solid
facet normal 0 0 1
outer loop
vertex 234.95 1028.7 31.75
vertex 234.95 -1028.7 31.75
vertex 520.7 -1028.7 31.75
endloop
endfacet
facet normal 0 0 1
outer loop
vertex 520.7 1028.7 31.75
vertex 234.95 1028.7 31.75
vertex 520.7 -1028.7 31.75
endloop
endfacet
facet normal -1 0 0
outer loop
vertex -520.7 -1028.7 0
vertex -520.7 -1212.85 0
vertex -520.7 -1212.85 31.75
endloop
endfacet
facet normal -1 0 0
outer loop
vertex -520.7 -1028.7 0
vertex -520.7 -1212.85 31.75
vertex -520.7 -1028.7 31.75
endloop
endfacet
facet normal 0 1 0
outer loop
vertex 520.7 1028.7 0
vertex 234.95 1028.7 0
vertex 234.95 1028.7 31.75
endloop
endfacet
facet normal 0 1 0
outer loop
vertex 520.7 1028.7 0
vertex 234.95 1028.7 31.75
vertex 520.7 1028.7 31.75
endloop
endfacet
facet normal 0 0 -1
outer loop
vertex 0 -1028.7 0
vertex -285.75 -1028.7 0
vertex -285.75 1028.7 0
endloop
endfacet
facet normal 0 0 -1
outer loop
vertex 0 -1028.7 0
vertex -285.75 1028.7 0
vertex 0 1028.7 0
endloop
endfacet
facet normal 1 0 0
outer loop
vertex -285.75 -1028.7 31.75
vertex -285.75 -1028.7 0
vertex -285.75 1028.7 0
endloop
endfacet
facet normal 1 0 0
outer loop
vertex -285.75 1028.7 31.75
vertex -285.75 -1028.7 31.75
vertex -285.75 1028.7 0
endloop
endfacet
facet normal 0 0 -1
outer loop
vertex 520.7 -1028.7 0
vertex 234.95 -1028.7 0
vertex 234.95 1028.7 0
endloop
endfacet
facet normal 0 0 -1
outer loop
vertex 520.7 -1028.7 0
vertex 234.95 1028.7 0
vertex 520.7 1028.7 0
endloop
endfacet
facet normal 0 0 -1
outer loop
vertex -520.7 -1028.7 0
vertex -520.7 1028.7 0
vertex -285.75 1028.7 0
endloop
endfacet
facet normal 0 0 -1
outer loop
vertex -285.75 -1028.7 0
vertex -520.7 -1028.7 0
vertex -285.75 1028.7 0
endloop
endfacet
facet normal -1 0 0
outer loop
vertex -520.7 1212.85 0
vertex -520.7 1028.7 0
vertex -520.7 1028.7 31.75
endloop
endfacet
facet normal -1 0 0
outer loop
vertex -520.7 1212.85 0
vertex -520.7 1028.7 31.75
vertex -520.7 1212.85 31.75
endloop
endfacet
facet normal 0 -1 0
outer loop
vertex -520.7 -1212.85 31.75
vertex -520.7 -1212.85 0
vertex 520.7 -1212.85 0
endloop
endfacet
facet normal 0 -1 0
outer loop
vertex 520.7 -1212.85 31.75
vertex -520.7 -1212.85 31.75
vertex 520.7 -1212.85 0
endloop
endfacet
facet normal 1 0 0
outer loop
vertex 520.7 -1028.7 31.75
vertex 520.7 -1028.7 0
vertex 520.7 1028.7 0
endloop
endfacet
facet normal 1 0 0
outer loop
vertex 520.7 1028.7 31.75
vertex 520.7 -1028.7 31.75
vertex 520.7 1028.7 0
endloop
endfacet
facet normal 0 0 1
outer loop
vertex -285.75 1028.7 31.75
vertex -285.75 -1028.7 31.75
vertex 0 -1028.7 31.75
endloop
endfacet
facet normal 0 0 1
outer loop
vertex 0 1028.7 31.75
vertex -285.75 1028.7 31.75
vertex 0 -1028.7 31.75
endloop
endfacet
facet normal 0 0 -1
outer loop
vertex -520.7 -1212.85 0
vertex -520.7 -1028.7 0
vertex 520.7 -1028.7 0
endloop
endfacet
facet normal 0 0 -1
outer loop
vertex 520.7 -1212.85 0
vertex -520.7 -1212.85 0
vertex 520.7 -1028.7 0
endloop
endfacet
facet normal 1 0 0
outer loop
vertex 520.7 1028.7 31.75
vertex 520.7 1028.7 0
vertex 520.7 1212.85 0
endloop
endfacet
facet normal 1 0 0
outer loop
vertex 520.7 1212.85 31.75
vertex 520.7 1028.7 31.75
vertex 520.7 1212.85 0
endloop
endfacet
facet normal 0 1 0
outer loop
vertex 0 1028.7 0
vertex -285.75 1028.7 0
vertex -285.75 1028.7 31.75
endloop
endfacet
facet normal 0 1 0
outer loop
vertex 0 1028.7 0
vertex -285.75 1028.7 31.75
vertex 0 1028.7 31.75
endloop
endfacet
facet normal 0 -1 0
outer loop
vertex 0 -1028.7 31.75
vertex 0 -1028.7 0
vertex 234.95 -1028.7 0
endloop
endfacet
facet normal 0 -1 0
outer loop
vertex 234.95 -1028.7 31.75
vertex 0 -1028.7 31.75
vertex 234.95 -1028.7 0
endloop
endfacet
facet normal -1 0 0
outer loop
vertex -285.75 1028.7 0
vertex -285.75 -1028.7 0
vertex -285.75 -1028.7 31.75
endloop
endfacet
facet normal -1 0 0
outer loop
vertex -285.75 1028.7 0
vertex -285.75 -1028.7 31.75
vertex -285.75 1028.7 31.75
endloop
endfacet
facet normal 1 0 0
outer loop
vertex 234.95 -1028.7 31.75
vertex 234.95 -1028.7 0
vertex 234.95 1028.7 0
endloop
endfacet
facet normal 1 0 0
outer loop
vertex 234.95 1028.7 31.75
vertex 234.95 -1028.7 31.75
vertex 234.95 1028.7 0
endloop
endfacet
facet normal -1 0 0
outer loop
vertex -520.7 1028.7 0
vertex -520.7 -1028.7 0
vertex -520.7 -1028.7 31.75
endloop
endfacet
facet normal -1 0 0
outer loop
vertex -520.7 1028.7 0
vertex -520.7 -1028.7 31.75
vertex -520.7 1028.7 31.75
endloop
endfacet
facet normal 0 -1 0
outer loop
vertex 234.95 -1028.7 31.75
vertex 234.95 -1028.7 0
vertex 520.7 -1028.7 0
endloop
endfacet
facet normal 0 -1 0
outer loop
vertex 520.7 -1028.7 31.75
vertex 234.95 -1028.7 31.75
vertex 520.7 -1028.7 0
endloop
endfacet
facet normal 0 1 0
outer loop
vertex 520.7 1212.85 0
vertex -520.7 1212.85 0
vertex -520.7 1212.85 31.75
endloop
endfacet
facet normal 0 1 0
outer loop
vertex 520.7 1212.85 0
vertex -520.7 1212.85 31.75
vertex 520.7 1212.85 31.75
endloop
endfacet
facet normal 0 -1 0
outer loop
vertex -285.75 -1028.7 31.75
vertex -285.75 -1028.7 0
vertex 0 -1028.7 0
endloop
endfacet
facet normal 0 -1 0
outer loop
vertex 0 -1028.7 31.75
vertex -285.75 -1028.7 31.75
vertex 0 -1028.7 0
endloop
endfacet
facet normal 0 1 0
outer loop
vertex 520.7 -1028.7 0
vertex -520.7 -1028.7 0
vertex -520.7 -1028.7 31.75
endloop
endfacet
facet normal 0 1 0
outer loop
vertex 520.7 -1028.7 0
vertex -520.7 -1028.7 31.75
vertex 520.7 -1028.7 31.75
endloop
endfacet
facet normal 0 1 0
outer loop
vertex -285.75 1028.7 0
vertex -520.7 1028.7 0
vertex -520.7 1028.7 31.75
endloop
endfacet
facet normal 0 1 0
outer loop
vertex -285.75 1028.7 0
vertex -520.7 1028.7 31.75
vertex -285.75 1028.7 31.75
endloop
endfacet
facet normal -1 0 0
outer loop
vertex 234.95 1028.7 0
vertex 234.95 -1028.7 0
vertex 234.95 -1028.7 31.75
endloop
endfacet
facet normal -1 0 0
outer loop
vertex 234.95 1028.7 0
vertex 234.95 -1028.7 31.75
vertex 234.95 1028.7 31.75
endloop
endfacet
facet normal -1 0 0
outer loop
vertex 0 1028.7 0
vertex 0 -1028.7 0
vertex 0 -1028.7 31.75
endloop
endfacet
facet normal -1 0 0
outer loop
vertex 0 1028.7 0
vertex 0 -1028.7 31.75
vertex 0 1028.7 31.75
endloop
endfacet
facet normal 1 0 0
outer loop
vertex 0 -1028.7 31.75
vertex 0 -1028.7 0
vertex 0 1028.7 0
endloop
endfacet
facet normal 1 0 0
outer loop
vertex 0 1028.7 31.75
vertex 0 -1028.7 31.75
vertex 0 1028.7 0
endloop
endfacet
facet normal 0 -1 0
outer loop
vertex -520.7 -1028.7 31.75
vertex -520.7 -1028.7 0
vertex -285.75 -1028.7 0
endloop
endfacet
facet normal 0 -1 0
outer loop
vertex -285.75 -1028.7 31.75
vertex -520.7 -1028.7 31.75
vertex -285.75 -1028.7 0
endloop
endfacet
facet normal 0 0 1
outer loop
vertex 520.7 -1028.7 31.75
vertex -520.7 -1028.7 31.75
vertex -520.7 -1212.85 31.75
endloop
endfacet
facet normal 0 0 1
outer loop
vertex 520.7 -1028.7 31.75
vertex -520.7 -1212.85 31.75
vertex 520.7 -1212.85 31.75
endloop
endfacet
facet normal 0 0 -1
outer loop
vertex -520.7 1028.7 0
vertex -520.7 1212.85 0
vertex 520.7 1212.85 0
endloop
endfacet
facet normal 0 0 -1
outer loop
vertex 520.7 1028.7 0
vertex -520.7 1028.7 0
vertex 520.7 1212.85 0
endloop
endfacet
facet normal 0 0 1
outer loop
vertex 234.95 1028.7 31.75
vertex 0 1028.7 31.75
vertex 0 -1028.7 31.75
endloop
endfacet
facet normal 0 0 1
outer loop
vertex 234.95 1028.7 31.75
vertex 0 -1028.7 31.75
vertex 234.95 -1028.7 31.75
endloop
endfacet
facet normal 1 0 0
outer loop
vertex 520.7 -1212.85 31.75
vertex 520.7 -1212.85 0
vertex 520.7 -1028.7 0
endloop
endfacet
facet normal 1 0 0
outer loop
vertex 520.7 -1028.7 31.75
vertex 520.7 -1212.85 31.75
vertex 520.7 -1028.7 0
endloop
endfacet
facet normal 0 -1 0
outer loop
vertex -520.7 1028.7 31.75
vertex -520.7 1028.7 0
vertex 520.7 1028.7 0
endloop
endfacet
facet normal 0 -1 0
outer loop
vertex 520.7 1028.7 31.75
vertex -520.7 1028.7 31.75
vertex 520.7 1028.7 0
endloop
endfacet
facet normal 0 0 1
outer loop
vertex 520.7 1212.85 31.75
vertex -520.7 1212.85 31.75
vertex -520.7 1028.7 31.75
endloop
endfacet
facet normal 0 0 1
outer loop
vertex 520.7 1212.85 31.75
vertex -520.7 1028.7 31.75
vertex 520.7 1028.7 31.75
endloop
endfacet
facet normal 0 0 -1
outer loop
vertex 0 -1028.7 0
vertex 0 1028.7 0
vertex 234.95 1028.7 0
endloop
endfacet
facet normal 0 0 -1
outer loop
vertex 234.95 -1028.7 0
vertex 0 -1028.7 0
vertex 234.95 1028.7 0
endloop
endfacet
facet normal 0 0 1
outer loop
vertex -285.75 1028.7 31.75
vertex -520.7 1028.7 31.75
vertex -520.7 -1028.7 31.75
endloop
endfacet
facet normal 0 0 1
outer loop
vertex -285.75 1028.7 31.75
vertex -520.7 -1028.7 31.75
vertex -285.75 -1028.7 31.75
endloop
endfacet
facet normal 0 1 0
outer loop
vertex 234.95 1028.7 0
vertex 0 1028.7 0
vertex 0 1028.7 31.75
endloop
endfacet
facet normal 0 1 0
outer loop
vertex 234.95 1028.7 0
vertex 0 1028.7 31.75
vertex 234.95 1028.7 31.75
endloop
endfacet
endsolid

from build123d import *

# Parameters (mm, degrees)
F0_W     = 285.75
F0_H     = 2057.4
F5_DEPTH = 31.75
F1_W     = 234.95
F1_H     = 2057.4
F2_W     = 285.75
F2_H     = 2057.4
F3_W     = 234.95
F3_H     = 2057.4
F4_W     = 1041.4
F4_H     = 184.15


with BuildPart() as f5:
    # F0 (on Top) → F5 (new body)
    with BuildSketch(Plane.XY):
        with Locations((-142.875, 0)):
            Rectangle(F0_W, F0_H)
    extrude(amount=F5_DEPTH)


with BuildPart() as f5b:
    # F1 (on Top) → F5, piece 2 (new body)
    with BuildSketch(Plane.XY):
        with Locations((117.475, 0)):
            Rectangle(F1_W, F1_H)
    extrude(amount=F5_DEPTH)


with BuildPart() as f5c:
    # F2 (on Top) → F5, piece 3 (new body)
    with BuildSketch(Plane.XY):
        with Locations((377.825, 0)):
            Rectangle(F2_W, F2_H)
    extrude(amount=F5_DEPTH)


with BuildPart() as f5d:
    # F3 (on Top) → F5, piece 4 (new body)
    with BuildSketch(Plane.XY):
        with Locations((-403.225, 0)):
            Rectangle(F3_W, F3_H)
    extrude(amount=F5_DEPTH)


with BuildPart() as f5e:
    # F4 (on Top) → F5, piece 5 (new body)
    with BuildSketch(Plane.XY):
        with Locations((0, 1120.775)):
            Rectangle(F4_W, F4_H)
    extrude(amount=F5_DEPTH)


with BuildPart() as f5f:
    # F4 (on Top) → F5, piece 6 (new body)
    with BuildSketch(Plane.XY):
        with Locations((0, -1120.775)):
            Rectangle(F4_W, F4_H)
    extrude(amount=F5_DEPTH)


solid = Compound([f5.part, f5b.part, f5c.part, f5d.part, f5e.part, f5f.part])
